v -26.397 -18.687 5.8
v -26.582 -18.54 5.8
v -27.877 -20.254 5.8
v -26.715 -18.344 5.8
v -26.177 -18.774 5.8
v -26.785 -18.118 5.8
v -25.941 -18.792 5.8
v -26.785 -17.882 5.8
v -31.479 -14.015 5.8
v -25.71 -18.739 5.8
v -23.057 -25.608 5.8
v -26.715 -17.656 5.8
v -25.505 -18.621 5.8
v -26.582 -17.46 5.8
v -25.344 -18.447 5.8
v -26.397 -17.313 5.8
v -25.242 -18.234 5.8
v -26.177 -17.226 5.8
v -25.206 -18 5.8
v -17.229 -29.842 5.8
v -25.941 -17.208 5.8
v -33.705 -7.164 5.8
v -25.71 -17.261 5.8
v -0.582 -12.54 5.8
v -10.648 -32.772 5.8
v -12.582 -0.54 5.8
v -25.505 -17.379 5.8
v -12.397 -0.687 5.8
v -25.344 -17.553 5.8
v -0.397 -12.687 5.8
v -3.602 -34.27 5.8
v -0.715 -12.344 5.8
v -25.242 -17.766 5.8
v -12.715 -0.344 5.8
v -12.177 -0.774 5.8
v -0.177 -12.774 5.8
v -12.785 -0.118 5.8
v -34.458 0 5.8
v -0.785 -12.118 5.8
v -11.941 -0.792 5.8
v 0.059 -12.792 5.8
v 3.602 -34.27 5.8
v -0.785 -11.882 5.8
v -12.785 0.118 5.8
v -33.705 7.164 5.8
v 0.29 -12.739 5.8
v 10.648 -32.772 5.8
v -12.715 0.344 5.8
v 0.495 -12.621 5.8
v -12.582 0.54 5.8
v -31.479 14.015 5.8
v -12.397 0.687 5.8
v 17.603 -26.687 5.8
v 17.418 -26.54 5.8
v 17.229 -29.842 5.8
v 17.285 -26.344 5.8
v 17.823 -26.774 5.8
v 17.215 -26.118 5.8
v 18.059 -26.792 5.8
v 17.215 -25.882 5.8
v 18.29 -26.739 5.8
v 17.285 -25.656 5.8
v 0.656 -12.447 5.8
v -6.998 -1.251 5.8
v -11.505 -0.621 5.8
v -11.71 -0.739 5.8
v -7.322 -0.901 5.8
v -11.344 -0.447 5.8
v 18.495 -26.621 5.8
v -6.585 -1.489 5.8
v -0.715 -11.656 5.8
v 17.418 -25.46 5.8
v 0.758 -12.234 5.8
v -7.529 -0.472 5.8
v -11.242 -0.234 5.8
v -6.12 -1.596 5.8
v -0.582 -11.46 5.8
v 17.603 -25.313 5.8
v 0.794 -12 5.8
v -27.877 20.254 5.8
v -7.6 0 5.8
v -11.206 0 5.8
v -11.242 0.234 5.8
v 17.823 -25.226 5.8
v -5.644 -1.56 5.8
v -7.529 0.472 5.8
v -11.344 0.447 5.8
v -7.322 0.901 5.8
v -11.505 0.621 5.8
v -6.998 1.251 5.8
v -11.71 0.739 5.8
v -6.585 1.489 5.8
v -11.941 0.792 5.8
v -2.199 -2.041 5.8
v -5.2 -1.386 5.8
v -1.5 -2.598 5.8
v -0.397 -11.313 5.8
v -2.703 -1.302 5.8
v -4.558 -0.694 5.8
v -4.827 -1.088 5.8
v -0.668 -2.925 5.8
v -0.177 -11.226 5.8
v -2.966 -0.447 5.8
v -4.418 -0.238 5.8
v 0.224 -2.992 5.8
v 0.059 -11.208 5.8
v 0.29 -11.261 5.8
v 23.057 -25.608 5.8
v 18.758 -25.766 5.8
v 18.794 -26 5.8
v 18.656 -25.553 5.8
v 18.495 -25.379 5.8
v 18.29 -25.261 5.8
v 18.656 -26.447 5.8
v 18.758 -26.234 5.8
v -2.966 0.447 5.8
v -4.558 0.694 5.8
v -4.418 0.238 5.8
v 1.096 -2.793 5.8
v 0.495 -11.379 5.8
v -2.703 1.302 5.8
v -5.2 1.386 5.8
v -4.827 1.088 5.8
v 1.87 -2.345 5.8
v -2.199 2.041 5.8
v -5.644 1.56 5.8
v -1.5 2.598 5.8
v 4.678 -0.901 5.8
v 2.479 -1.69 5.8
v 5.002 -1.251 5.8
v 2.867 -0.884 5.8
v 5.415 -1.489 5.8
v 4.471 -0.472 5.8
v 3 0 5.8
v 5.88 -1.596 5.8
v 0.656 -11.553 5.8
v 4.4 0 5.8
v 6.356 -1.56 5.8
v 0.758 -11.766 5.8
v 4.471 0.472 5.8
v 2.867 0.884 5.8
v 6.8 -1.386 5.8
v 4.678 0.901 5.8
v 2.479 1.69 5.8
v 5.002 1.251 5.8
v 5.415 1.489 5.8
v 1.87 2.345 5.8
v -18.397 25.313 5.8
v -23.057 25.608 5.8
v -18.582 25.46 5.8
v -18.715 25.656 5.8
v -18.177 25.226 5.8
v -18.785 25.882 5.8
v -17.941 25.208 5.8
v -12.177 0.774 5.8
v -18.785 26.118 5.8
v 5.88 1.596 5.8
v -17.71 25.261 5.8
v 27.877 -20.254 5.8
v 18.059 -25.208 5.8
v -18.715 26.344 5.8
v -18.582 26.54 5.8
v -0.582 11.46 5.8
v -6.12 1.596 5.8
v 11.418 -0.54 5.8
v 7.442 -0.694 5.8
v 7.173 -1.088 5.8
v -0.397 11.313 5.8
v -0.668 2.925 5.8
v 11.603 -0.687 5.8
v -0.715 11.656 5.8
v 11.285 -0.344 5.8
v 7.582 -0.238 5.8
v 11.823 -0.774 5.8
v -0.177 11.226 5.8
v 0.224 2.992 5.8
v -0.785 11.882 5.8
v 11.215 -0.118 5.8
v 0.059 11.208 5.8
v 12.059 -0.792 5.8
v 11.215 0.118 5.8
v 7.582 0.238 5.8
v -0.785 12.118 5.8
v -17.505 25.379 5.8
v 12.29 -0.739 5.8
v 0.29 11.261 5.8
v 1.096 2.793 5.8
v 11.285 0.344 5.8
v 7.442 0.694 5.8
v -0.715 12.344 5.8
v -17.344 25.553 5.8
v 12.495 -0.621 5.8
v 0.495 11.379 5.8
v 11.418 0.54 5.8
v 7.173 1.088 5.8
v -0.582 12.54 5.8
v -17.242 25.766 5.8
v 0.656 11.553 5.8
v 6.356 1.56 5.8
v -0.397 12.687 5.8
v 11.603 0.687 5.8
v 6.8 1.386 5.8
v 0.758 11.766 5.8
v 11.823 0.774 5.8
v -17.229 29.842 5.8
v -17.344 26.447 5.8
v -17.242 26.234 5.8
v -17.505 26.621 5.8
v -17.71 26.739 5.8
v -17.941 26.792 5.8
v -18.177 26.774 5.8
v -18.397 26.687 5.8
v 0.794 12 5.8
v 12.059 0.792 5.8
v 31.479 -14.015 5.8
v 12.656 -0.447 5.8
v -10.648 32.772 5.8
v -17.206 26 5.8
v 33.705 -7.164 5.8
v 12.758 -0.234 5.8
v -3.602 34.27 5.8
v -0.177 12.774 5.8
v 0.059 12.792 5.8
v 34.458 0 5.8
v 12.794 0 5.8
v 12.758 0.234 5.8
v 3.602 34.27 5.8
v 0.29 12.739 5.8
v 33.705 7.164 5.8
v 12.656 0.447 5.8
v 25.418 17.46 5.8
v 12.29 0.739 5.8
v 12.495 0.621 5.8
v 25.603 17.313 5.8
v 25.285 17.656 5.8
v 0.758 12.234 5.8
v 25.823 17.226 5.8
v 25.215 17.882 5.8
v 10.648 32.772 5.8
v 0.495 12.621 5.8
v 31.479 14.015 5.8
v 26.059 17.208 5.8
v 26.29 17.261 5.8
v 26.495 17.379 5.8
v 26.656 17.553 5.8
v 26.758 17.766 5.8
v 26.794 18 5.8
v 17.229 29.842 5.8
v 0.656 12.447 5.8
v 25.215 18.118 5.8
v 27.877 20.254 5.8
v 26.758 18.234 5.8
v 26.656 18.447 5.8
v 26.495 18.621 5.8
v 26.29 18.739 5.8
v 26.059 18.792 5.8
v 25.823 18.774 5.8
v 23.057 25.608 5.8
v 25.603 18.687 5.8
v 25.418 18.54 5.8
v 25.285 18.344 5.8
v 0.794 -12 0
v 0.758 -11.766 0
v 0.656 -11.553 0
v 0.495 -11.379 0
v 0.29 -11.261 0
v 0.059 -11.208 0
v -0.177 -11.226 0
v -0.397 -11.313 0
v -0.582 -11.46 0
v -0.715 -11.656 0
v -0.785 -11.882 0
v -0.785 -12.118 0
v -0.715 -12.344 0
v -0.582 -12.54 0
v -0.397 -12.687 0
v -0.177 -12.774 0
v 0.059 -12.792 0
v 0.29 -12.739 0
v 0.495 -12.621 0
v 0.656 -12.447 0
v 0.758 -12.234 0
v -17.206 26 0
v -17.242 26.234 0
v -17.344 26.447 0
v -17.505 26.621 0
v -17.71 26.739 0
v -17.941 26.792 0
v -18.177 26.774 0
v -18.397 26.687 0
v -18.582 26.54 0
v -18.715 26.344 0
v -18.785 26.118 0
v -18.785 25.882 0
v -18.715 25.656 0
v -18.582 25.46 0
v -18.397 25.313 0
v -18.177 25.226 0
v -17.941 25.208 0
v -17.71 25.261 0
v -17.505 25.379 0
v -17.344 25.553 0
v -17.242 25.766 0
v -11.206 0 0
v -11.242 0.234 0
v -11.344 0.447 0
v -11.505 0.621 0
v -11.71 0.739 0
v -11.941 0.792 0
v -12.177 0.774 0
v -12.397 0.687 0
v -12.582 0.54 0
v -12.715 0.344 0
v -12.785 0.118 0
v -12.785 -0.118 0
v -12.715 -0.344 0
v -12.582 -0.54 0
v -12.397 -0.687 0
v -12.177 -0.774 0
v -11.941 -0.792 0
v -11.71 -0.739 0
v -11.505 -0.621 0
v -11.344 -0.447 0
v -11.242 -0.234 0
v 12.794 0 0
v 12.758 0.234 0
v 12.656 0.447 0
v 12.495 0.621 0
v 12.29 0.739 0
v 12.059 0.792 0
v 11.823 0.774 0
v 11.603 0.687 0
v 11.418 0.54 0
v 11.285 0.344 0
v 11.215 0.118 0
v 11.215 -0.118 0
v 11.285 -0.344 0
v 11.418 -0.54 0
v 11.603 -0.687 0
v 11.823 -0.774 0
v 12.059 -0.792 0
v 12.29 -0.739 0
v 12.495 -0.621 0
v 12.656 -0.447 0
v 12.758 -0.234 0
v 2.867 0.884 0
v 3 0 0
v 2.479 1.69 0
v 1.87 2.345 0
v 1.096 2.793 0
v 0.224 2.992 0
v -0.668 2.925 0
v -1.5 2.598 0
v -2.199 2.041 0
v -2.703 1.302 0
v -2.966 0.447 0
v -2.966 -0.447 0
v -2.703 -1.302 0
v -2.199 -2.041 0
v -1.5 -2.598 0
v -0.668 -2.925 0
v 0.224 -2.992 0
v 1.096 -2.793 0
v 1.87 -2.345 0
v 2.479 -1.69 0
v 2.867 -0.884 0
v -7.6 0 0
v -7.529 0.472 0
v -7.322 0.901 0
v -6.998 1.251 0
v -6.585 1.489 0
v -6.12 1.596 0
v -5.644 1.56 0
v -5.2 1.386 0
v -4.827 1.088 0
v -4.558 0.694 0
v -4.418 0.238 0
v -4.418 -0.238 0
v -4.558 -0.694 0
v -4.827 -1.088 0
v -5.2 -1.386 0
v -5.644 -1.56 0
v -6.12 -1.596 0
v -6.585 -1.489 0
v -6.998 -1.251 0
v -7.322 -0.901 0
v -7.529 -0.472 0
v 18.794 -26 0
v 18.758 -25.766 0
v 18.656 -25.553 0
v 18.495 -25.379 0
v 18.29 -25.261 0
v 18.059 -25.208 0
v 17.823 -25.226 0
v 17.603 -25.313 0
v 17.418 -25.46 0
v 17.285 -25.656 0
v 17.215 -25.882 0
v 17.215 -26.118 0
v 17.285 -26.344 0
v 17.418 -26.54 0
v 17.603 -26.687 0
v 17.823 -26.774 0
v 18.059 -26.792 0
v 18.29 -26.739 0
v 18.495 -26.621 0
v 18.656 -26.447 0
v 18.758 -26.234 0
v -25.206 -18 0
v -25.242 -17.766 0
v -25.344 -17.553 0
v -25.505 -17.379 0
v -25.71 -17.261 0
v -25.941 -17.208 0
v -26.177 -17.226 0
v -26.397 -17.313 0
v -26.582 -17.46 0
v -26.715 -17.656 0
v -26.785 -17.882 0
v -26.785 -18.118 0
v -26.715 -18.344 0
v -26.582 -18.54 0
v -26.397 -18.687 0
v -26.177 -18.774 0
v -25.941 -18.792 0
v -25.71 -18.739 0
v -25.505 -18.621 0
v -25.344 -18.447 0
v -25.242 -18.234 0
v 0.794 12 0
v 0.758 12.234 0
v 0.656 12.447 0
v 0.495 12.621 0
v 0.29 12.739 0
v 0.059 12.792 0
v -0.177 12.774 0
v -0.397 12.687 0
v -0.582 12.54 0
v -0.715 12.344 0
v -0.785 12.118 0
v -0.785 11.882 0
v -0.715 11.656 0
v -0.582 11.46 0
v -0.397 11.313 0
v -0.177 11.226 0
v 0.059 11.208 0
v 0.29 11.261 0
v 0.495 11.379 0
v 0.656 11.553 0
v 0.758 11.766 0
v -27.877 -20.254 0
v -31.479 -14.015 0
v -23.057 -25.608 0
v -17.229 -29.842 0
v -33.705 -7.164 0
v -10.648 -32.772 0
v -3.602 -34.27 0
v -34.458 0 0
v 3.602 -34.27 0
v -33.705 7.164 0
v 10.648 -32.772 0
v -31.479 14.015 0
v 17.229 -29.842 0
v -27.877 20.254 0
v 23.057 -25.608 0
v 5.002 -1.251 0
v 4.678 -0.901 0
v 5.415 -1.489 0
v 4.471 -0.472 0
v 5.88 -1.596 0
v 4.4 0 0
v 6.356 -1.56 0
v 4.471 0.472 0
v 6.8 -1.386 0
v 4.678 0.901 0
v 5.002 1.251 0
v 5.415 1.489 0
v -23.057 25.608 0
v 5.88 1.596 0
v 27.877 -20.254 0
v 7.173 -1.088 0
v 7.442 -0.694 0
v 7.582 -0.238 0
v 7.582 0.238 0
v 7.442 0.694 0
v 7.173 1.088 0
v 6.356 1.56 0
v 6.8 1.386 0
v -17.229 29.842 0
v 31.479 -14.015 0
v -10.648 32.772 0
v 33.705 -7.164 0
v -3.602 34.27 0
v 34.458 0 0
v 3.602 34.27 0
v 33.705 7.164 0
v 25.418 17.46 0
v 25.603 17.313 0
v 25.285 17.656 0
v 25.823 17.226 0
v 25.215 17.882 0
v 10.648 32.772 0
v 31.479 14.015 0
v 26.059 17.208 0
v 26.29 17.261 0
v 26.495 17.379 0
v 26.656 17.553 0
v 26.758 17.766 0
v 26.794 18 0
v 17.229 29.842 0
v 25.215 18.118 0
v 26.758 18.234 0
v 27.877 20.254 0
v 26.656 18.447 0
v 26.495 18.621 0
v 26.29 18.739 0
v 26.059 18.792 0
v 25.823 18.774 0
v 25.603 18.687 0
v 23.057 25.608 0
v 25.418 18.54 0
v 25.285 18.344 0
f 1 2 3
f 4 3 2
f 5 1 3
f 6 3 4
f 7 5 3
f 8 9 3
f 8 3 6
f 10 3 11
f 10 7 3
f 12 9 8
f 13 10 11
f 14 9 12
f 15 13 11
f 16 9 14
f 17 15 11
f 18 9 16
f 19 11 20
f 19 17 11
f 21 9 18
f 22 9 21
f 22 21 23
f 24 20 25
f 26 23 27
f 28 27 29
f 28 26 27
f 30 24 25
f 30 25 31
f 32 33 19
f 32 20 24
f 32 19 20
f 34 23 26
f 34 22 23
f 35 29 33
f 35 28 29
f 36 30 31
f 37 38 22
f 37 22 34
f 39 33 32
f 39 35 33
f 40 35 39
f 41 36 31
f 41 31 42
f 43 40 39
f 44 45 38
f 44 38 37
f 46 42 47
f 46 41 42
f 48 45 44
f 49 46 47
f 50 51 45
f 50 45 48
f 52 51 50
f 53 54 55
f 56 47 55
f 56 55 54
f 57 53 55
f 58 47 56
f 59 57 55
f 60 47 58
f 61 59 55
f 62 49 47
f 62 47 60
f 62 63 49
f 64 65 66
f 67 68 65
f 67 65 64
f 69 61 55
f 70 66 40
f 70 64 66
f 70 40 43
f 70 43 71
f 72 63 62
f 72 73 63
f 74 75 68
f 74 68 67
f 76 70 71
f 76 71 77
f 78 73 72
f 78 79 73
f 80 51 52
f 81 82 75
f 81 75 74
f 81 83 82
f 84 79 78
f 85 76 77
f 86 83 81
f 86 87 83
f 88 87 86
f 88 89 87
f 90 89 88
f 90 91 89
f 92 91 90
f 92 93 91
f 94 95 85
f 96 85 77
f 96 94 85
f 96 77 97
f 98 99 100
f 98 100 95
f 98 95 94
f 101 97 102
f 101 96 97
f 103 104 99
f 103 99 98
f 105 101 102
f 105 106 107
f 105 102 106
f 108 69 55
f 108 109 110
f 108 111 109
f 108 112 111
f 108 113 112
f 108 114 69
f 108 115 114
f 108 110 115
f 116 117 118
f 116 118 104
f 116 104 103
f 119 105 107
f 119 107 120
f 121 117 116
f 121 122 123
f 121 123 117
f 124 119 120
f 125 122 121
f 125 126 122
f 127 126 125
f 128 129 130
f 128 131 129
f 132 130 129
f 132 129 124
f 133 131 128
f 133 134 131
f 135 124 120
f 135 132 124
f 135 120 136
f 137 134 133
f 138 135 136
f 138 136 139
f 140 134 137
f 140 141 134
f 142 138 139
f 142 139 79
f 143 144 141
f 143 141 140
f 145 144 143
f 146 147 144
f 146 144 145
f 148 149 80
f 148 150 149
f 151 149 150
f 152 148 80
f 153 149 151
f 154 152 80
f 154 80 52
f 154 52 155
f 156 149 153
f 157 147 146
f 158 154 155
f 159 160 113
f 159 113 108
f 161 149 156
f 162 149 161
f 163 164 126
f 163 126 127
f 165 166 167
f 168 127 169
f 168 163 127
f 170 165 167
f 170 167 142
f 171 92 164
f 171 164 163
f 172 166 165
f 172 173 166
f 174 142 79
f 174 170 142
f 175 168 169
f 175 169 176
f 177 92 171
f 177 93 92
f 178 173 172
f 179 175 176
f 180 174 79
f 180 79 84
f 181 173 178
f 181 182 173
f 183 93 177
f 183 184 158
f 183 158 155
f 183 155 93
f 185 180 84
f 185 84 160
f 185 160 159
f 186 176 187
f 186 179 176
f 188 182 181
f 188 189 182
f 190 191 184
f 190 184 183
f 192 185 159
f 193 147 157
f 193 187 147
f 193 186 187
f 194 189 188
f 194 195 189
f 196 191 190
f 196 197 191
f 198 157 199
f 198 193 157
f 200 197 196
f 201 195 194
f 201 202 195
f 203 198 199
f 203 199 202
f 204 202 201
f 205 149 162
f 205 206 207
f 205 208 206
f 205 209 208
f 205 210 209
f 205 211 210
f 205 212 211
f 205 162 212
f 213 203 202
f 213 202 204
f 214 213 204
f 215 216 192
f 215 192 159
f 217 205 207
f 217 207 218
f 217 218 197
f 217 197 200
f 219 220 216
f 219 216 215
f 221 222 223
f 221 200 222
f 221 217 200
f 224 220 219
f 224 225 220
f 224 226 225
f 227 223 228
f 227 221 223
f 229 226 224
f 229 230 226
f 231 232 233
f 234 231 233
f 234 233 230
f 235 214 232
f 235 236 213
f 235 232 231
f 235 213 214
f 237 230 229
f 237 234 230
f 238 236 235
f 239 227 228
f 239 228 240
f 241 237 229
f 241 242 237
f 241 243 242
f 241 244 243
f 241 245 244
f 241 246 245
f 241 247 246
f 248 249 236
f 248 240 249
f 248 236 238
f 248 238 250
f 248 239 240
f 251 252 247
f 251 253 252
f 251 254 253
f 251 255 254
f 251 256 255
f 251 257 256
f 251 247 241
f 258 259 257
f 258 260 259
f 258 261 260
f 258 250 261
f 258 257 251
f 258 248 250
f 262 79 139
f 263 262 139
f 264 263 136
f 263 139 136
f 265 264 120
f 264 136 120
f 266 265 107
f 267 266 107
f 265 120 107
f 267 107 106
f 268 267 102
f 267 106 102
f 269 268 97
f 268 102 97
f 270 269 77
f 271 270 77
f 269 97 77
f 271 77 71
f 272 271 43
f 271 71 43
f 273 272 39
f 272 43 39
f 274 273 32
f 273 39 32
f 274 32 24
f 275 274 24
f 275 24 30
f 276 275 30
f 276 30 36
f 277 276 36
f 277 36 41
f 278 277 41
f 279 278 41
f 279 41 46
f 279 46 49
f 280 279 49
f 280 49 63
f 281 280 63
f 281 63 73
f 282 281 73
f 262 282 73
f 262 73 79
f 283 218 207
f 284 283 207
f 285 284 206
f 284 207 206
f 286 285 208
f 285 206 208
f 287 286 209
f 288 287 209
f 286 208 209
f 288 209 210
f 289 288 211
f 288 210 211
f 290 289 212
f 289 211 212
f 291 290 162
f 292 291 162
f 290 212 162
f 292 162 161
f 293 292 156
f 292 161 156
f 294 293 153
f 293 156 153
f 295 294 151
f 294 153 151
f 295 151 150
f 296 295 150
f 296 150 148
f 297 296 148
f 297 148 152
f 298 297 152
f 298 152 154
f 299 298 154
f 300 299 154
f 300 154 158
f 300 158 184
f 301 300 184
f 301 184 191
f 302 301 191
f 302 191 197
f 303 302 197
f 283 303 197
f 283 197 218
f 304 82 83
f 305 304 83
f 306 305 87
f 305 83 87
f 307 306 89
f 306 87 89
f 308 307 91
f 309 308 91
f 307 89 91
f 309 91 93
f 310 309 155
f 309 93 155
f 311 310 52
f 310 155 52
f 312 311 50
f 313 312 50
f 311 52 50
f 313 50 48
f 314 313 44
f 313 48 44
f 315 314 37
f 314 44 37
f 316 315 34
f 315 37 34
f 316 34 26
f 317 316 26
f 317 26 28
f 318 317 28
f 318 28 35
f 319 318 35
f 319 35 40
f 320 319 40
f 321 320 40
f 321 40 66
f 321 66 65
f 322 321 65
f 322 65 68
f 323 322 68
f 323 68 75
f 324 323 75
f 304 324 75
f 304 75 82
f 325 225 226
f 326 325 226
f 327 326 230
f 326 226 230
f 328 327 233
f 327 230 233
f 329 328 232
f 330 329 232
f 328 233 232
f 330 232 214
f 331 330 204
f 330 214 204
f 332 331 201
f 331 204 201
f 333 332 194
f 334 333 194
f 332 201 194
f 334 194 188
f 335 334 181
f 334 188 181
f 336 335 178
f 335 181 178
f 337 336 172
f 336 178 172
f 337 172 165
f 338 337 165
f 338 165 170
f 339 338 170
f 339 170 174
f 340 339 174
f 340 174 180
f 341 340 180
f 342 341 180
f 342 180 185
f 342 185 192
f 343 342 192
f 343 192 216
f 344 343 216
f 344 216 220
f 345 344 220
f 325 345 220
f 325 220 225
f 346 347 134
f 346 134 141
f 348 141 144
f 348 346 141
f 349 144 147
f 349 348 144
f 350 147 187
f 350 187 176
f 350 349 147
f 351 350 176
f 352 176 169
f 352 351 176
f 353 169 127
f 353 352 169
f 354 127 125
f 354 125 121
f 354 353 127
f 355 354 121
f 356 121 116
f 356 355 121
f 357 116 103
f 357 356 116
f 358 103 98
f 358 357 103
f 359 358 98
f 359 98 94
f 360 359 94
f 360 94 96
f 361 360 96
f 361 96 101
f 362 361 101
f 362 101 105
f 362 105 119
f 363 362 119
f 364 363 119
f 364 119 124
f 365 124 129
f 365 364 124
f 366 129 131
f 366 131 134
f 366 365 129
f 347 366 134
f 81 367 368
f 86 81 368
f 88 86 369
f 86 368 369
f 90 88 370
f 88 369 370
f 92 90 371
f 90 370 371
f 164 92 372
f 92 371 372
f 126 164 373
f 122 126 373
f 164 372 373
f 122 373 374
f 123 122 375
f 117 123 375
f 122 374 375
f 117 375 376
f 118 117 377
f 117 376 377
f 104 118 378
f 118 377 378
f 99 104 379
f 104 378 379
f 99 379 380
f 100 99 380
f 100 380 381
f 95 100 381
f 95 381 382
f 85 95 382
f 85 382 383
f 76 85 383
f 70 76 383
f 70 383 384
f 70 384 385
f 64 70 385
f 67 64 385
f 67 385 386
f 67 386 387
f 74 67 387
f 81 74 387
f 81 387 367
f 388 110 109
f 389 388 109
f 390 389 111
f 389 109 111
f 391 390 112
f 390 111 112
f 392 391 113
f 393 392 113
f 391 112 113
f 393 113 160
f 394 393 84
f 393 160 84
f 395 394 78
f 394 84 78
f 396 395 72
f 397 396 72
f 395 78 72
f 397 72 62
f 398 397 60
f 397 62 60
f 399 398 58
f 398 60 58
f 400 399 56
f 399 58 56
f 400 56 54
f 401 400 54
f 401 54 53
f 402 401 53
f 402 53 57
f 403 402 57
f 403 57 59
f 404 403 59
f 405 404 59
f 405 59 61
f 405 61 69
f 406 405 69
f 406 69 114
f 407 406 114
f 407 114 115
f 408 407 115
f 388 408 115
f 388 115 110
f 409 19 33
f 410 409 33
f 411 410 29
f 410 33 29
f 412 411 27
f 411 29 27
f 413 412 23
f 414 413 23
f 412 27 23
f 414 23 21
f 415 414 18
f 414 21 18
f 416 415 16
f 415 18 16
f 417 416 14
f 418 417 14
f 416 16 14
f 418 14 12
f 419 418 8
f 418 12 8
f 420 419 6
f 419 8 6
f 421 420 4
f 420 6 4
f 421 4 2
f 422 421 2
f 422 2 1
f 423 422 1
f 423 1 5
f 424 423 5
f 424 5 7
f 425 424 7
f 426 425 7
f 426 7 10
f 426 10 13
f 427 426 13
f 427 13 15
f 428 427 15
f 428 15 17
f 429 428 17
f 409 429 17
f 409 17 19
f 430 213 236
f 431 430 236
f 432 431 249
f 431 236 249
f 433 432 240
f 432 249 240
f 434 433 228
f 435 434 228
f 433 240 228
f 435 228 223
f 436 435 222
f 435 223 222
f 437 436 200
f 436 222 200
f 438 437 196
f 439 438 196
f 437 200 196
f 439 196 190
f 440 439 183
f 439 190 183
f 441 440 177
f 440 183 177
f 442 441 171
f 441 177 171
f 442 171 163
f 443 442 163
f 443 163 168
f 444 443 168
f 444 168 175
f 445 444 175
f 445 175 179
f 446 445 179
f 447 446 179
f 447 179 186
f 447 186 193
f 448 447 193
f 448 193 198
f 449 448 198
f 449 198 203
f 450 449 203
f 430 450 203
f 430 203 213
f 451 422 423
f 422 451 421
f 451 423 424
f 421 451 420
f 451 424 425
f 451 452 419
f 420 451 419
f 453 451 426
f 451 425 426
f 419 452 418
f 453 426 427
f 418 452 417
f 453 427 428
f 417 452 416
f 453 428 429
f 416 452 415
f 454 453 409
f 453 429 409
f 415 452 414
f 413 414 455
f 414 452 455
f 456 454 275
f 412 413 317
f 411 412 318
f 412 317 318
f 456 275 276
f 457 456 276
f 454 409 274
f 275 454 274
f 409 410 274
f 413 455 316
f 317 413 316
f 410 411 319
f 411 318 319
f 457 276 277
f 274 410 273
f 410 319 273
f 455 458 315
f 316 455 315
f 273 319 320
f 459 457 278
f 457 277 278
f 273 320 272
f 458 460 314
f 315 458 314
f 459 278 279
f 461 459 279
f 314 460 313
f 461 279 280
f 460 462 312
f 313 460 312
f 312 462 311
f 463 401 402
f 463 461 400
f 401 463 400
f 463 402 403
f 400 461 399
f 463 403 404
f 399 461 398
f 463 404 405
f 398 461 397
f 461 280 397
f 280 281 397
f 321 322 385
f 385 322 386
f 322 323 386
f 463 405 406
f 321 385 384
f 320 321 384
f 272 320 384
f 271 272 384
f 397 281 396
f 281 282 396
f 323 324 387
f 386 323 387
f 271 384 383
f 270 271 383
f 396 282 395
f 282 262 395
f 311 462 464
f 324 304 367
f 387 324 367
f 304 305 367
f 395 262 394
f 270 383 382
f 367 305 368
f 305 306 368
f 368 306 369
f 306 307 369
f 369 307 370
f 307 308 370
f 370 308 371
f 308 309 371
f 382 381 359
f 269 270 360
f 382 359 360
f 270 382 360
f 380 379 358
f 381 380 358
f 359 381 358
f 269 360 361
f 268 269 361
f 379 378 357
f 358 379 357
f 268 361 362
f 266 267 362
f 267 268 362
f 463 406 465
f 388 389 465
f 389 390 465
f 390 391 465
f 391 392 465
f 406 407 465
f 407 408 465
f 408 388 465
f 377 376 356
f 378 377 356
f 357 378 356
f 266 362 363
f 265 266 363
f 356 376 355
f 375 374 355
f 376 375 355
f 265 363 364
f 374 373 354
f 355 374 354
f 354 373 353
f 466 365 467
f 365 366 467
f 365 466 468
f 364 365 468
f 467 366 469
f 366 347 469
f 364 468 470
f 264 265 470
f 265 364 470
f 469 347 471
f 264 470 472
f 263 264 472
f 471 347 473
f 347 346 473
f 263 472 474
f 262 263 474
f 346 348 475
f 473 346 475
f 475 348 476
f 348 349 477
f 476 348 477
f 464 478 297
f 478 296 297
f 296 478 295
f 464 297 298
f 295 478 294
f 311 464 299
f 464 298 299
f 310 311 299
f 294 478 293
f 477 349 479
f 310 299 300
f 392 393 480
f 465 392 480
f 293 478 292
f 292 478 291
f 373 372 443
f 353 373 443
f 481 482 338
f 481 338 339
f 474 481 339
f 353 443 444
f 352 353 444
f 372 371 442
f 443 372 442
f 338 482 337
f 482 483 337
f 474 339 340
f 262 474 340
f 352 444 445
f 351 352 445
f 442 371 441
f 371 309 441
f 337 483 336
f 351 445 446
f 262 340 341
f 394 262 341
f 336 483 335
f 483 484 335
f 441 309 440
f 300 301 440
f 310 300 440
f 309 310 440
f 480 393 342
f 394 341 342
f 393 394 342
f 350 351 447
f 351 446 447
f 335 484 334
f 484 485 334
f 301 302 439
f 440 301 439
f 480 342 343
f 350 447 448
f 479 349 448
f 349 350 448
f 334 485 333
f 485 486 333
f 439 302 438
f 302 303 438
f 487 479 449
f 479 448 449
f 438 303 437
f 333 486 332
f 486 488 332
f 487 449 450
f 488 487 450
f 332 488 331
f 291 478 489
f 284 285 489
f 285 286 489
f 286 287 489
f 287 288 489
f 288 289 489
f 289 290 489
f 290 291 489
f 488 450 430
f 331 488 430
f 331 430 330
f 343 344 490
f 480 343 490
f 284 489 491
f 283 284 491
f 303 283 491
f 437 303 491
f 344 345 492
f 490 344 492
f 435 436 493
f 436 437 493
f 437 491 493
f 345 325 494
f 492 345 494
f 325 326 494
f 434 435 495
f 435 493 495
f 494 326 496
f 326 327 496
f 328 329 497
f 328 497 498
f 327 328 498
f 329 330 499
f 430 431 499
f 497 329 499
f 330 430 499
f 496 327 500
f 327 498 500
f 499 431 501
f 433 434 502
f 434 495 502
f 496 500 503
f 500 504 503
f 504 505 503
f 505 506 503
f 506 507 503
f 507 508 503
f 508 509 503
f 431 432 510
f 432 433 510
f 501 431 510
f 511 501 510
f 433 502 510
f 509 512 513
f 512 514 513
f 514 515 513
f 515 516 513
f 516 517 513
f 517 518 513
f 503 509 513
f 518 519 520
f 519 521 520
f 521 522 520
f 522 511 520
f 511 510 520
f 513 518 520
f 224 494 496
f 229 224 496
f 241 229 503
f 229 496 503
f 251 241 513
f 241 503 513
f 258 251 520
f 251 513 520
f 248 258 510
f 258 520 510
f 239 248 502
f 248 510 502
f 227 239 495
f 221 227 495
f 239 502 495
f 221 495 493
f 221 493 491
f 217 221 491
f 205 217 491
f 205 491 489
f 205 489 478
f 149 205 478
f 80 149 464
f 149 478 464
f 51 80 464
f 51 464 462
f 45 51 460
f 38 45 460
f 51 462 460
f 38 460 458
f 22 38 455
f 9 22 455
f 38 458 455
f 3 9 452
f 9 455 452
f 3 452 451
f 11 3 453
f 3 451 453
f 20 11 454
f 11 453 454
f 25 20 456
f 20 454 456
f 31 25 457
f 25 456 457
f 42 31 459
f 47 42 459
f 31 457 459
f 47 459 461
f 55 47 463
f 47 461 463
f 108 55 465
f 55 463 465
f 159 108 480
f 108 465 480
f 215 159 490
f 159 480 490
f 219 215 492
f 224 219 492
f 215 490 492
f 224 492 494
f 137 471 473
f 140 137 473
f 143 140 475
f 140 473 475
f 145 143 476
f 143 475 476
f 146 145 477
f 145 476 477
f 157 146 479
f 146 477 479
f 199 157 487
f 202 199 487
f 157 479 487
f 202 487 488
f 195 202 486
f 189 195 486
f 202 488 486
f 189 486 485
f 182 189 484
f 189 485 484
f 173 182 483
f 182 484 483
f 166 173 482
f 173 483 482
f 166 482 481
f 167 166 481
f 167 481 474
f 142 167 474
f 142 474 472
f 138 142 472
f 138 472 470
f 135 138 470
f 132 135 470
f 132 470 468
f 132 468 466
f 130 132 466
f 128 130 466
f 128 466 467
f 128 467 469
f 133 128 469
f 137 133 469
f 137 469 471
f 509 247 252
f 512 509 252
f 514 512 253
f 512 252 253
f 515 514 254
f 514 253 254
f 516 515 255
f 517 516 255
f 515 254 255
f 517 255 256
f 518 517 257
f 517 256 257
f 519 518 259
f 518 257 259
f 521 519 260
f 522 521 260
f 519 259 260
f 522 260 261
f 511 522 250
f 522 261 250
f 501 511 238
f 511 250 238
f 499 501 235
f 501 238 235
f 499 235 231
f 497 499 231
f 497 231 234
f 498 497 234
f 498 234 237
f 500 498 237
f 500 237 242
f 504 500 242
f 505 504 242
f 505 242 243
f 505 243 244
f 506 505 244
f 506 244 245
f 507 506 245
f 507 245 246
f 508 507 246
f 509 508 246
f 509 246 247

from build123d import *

# Parameters (mm, degrees)
SKETCH1_R                = 34.458333333
SKETCH1_R_2              = 3
BOSS_EXTRUDE1_DEPTH      = 5.8
SKETCH2_R                = 0.79375
CUT_EXTRUDE1_DEPTH       = 50.075385604
M3_CLEARANCE_HOLE1_D     = 3.2
M3_CLEARANCE_HOLE1_DEPTH = 12.7
M3_CLEARANCE_HOLE1_TIP   = 0.96137699


with BuildPart() as part:
    # Sketch1 → Boss-Extrude1 (new body)
    with BuildSketch(Plane.XY):
        Circle(SKETCH1_R)
        Circle(SKETCH1_R_2, mode=Mode.SUBTRACT)
    extrude(amount=BOSS_EXTRUDE1_DEPTH)

    # Sketch2 → Cut-Extrude1 (cut, through all)
    with BuildSketch(Plane.XY.offset(5.8)):
        with Locations((0, 12)):
            Circle(SKETCH2_R)
        with Locations((12, 0)):
            Circle(SKETCH2_R)
        with Locations((0, -12)):
            Circle(SKETCH2_R)
        with Locations((-12, 0)):
            Circle(SKETCH2_R)
        with Locations((-18, 26)):
            Circle(SKETCH2_R)
        with Locations((26, 18)):
            Circle(SKETCH2_R)
        with Locations((18, -26)):
            Circle(SKETCH2_R)
        with Locations((-26, -18)):
            Circle(SKETCH2_R)
    extrude(amount=-CUT_EXTRUDE1_DEPTH, mode=Mode.SUBTRACT)

    # M3 Clearance Hole1
    with Locations(Plane.XY.offset(5.8)):
        with Locations((-6, 0), (6, 0)):
            Hole(M3_CLEARANCE_HOLE1_D / 2, depth=M3_CLEARANCE_HOLE1_DEPTH)
            with Locations((0, 0, -(M3_CLEARANCE_HOLE1_DEPTH + M3_CLEARANCE_HOLE1_TIP / 2))):  # 118° drill point
                Cone(0, M3_CLEARANCE_HOLE1_D / 2, M3_CLEARANCE_HOLE1_TIP, mode=Mode.SUBTRACT)


solid = part.part
